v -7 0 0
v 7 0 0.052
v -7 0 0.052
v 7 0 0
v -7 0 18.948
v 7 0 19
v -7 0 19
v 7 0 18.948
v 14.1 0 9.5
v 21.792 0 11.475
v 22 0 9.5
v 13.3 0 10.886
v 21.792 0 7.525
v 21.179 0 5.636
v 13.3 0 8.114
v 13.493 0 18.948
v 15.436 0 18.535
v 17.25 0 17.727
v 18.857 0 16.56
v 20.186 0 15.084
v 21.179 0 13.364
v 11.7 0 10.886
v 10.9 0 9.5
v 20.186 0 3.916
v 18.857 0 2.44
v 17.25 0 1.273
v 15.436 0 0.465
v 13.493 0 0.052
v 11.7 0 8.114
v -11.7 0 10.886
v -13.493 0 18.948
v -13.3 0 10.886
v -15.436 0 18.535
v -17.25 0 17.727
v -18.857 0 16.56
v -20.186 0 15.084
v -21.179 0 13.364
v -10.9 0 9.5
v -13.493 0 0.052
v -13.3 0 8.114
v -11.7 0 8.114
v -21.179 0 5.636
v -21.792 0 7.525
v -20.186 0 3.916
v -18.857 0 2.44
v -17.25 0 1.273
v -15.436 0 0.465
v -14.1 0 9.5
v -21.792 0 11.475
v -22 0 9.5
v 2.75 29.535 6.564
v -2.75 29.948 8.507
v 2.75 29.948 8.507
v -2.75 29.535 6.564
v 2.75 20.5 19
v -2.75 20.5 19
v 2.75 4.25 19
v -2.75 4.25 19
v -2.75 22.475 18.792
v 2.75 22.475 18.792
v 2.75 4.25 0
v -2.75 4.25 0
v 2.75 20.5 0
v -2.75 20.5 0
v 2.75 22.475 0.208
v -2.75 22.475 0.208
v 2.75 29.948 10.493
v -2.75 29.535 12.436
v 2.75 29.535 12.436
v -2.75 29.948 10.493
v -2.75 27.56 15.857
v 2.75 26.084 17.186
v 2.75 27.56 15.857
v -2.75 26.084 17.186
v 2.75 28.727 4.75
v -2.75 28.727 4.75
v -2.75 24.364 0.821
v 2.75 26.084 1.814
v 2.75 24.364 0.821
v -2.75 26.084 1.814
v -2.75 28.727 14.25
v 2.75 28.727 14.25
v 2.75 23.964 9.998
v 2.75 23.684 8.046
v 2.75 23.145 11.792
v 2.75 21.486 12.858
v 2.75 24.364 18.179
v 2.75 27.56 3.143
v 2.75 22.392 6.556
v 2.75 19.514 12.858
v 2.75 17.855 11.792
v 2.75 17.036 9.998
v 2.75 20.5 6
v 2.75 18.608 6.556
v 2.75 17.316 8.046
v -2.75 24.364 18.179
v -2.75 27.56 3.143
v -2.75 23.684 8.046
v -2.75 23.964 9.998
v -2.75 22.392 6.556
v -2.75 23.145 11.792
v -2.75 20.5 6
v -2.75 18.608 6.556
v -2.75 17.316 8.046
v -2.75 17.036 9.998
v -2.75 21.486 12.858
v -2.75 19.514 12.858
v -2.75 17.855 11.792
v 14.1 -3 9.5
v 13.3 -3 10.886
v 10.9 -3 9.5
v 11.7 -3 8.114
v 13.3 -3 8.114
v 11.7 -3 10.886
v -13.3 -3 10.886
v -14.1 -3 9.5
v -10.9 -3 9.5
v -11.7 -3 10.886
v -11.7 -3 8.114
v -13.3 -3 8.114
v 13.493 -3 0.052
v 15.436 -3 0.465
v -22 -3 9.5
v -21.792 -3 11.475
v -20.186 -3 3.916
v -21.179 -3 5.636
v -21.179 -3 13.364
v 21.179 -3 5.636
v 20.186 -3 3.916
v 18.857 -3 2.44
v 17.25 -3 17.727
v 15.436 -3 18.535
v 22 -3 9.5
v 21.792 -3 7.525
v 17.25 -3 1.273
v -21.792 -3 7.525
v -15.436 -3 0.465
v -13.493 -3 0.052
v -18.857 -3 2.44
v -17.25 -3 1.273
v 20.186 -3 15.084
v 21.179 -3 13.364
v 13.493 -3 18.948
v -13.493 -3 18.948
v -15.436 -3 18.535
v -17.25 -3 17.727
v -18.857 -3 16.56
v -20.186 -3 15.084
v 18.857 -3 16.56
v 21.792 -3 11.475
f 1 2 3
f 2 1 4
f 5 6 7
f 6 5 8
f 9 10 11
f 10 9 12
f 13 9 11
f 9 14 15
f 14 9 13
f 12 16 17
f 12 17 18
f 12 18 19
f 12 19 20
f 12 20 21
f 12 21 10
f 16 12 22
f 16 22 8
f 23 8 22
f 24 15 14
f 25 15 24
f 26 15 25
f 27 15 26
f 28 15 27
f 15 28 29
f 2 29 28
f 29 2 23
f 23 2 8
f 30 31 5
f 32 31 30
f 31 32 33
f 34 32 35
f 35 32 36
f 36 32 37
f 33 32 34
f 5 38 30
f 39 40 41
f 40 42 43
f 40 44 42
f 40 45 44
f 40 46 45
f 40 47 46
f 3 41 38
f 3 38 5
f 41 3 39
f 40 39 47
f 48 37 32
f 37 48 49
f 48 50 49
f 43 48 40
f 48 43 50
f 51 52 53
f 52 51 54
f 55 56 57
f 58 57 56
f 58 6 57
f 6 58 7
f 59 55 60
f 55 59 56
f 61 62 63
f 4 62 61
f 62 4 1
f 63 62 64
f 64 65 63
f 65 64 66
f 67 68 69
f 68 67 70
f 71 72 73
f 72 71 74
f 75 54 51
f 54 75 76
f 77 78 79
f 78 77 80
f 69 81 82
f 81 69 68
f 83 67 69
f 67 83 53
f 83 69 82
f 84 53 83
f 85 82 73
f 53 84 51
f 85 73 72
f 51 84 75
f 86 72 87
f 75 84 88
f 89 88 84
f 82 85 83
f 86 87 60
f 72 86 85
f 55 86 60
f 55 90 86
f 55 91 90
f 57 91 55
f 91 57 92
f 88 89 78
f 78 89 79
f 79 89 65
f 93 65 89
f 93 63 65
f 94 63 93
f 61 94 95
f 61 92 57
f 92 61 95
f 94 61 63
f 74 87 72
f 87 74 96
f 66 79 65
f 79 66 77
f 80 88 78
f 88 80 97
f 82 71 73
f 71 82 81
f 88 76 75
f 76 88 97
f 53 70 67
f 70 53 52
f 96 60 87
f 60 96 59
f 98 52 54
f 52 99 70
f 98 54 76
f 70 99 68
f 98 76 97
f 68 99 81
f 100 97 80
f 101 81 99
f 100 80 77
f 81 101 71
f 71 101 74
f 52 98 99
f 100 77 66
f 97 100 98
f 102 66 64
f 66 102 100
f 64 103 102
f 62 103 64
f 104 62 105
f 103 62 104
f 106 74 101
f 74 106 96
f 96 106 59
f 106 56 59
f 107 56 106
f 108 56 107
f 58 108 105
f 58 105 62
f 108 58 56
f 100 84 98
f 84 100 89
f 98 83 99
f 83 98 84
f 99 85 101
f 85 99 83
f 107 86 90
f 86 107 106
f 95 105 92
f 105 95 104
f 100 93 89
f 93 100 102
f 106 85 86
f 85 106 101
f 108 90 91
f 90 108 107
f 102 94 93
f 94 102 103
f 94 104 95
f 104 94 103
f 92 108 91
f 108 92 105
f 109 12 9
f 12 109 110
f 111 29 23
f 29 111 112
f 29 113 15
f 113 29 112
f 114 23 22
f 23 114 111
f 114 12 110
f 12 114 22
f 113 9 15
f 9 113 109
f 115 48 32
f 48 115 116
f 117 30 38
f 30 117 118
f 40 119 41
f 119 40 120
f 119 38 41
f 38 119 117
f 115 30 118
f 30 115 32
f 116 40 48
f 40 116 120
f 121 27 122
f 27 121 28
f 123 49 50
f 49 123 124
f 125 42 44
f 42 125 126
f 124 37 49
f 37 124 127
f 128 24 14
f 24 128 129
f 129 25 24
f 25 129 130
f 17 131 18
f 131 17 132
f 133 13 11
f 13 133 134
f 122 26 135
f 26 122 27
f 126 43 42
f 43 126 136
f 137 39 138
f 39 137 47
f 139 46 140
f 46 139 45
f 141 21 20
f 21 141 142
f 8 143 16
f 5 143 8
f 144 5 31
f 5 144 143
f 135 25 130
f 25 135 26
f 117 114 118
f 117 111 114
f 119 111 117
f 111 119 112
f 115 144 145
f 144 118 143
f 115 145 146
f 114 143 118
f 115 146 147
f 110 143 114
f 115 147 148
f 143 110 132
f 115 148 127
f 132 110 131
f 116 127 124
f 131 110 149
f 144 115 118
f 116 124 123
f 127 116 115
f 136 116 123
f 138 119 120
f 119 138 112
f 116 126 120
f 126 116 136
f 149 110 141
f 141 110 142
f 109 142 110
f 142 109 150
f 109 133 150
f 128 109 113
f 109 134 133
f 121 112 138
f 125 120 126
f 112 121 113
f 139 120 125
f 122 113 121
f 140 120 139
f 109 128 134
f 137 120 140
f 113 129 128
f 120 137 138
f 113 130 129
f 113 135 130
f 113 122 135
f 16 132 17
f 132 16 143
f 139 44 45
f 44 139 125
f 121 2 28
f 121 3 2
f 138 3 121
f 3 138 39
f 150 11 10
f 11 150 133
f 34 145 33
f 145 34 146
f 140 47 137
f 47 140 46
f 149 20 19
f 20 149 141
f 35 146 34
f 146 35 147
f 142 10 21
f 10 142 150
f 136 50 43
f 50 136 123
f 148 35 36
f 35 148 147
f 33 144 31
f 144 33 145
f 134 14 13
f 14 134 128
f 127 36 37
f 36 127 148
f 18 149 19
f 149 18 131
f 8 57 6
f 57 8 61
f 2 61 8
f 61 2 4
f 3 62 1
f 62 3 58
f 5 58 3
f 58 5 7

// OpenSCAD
$e = 0.1;

ot_screw_sep = 25;
ot_screw_dia = 3.2;
ot_thickness = 3;
clamp_thickness = 5.5;
clamp_screw_dia = 7;
clamp_outer_dia = 19;
clamp_length = 30;

module clamp_part() {
  difference() {
    hull() {
      translate([-clamp_thickness / 2, 0, 0]) {
        cube([clamp_thickness, clamp_outer_dia, clamp_outer_dia]);
      }

      translate([
        -clamp_thickness / 2,
        clamp_length - clamp_outer_dia / 2,
        clamp_outer_dia / 2
      ])
        rotate([0, 90, 0]) cylinder(r = clamp_outer_dia / 2, h = clamp_thickness);
    }
    translate([
      -clamp_thickness / 2 - $e,
      clamp_length - clamp_outer_dia / 2,
      clamp_outer_dia / 2
    ])
      rotate([0, 90, 0])
        cylinder(r = clamp_screw_dia / 2, h = clamp_thickness + 2*$e);
  }
}

module ot_mount_part() {
  difference() {
    hull() {
      for (m = [0, 1]) mirror([m, 0, 0]) {
        rotate([90, 0, 0])
          translate([
            ot_screw_sep / 2,
            clamp_outer_dia / 2,
            0
          ])
            cylinder(r = clamp_outer_dia / 2, h = ot_thickness);
      }
    }
    for (m = [0, 1]) mirror([m, 0, 0]) {
      rotate([90, 0, 0])
        translate([
          ot_screw_sep / 2,
          clamp_outer_dia / 2,
          -$e
        ])
          cylinder(r = ot_screw_dia / 2, h = ot_thickness + 2*$e);
    }
  }
}

module fillet() {
  w = 7;
  linear_extrude(height = clamp_outer_dia) {
    polygon([
      [-w, 0], [w, 0], [0, w]
    ]);
  }
}

clamp_part();
ot_mount_part();
fillet();
